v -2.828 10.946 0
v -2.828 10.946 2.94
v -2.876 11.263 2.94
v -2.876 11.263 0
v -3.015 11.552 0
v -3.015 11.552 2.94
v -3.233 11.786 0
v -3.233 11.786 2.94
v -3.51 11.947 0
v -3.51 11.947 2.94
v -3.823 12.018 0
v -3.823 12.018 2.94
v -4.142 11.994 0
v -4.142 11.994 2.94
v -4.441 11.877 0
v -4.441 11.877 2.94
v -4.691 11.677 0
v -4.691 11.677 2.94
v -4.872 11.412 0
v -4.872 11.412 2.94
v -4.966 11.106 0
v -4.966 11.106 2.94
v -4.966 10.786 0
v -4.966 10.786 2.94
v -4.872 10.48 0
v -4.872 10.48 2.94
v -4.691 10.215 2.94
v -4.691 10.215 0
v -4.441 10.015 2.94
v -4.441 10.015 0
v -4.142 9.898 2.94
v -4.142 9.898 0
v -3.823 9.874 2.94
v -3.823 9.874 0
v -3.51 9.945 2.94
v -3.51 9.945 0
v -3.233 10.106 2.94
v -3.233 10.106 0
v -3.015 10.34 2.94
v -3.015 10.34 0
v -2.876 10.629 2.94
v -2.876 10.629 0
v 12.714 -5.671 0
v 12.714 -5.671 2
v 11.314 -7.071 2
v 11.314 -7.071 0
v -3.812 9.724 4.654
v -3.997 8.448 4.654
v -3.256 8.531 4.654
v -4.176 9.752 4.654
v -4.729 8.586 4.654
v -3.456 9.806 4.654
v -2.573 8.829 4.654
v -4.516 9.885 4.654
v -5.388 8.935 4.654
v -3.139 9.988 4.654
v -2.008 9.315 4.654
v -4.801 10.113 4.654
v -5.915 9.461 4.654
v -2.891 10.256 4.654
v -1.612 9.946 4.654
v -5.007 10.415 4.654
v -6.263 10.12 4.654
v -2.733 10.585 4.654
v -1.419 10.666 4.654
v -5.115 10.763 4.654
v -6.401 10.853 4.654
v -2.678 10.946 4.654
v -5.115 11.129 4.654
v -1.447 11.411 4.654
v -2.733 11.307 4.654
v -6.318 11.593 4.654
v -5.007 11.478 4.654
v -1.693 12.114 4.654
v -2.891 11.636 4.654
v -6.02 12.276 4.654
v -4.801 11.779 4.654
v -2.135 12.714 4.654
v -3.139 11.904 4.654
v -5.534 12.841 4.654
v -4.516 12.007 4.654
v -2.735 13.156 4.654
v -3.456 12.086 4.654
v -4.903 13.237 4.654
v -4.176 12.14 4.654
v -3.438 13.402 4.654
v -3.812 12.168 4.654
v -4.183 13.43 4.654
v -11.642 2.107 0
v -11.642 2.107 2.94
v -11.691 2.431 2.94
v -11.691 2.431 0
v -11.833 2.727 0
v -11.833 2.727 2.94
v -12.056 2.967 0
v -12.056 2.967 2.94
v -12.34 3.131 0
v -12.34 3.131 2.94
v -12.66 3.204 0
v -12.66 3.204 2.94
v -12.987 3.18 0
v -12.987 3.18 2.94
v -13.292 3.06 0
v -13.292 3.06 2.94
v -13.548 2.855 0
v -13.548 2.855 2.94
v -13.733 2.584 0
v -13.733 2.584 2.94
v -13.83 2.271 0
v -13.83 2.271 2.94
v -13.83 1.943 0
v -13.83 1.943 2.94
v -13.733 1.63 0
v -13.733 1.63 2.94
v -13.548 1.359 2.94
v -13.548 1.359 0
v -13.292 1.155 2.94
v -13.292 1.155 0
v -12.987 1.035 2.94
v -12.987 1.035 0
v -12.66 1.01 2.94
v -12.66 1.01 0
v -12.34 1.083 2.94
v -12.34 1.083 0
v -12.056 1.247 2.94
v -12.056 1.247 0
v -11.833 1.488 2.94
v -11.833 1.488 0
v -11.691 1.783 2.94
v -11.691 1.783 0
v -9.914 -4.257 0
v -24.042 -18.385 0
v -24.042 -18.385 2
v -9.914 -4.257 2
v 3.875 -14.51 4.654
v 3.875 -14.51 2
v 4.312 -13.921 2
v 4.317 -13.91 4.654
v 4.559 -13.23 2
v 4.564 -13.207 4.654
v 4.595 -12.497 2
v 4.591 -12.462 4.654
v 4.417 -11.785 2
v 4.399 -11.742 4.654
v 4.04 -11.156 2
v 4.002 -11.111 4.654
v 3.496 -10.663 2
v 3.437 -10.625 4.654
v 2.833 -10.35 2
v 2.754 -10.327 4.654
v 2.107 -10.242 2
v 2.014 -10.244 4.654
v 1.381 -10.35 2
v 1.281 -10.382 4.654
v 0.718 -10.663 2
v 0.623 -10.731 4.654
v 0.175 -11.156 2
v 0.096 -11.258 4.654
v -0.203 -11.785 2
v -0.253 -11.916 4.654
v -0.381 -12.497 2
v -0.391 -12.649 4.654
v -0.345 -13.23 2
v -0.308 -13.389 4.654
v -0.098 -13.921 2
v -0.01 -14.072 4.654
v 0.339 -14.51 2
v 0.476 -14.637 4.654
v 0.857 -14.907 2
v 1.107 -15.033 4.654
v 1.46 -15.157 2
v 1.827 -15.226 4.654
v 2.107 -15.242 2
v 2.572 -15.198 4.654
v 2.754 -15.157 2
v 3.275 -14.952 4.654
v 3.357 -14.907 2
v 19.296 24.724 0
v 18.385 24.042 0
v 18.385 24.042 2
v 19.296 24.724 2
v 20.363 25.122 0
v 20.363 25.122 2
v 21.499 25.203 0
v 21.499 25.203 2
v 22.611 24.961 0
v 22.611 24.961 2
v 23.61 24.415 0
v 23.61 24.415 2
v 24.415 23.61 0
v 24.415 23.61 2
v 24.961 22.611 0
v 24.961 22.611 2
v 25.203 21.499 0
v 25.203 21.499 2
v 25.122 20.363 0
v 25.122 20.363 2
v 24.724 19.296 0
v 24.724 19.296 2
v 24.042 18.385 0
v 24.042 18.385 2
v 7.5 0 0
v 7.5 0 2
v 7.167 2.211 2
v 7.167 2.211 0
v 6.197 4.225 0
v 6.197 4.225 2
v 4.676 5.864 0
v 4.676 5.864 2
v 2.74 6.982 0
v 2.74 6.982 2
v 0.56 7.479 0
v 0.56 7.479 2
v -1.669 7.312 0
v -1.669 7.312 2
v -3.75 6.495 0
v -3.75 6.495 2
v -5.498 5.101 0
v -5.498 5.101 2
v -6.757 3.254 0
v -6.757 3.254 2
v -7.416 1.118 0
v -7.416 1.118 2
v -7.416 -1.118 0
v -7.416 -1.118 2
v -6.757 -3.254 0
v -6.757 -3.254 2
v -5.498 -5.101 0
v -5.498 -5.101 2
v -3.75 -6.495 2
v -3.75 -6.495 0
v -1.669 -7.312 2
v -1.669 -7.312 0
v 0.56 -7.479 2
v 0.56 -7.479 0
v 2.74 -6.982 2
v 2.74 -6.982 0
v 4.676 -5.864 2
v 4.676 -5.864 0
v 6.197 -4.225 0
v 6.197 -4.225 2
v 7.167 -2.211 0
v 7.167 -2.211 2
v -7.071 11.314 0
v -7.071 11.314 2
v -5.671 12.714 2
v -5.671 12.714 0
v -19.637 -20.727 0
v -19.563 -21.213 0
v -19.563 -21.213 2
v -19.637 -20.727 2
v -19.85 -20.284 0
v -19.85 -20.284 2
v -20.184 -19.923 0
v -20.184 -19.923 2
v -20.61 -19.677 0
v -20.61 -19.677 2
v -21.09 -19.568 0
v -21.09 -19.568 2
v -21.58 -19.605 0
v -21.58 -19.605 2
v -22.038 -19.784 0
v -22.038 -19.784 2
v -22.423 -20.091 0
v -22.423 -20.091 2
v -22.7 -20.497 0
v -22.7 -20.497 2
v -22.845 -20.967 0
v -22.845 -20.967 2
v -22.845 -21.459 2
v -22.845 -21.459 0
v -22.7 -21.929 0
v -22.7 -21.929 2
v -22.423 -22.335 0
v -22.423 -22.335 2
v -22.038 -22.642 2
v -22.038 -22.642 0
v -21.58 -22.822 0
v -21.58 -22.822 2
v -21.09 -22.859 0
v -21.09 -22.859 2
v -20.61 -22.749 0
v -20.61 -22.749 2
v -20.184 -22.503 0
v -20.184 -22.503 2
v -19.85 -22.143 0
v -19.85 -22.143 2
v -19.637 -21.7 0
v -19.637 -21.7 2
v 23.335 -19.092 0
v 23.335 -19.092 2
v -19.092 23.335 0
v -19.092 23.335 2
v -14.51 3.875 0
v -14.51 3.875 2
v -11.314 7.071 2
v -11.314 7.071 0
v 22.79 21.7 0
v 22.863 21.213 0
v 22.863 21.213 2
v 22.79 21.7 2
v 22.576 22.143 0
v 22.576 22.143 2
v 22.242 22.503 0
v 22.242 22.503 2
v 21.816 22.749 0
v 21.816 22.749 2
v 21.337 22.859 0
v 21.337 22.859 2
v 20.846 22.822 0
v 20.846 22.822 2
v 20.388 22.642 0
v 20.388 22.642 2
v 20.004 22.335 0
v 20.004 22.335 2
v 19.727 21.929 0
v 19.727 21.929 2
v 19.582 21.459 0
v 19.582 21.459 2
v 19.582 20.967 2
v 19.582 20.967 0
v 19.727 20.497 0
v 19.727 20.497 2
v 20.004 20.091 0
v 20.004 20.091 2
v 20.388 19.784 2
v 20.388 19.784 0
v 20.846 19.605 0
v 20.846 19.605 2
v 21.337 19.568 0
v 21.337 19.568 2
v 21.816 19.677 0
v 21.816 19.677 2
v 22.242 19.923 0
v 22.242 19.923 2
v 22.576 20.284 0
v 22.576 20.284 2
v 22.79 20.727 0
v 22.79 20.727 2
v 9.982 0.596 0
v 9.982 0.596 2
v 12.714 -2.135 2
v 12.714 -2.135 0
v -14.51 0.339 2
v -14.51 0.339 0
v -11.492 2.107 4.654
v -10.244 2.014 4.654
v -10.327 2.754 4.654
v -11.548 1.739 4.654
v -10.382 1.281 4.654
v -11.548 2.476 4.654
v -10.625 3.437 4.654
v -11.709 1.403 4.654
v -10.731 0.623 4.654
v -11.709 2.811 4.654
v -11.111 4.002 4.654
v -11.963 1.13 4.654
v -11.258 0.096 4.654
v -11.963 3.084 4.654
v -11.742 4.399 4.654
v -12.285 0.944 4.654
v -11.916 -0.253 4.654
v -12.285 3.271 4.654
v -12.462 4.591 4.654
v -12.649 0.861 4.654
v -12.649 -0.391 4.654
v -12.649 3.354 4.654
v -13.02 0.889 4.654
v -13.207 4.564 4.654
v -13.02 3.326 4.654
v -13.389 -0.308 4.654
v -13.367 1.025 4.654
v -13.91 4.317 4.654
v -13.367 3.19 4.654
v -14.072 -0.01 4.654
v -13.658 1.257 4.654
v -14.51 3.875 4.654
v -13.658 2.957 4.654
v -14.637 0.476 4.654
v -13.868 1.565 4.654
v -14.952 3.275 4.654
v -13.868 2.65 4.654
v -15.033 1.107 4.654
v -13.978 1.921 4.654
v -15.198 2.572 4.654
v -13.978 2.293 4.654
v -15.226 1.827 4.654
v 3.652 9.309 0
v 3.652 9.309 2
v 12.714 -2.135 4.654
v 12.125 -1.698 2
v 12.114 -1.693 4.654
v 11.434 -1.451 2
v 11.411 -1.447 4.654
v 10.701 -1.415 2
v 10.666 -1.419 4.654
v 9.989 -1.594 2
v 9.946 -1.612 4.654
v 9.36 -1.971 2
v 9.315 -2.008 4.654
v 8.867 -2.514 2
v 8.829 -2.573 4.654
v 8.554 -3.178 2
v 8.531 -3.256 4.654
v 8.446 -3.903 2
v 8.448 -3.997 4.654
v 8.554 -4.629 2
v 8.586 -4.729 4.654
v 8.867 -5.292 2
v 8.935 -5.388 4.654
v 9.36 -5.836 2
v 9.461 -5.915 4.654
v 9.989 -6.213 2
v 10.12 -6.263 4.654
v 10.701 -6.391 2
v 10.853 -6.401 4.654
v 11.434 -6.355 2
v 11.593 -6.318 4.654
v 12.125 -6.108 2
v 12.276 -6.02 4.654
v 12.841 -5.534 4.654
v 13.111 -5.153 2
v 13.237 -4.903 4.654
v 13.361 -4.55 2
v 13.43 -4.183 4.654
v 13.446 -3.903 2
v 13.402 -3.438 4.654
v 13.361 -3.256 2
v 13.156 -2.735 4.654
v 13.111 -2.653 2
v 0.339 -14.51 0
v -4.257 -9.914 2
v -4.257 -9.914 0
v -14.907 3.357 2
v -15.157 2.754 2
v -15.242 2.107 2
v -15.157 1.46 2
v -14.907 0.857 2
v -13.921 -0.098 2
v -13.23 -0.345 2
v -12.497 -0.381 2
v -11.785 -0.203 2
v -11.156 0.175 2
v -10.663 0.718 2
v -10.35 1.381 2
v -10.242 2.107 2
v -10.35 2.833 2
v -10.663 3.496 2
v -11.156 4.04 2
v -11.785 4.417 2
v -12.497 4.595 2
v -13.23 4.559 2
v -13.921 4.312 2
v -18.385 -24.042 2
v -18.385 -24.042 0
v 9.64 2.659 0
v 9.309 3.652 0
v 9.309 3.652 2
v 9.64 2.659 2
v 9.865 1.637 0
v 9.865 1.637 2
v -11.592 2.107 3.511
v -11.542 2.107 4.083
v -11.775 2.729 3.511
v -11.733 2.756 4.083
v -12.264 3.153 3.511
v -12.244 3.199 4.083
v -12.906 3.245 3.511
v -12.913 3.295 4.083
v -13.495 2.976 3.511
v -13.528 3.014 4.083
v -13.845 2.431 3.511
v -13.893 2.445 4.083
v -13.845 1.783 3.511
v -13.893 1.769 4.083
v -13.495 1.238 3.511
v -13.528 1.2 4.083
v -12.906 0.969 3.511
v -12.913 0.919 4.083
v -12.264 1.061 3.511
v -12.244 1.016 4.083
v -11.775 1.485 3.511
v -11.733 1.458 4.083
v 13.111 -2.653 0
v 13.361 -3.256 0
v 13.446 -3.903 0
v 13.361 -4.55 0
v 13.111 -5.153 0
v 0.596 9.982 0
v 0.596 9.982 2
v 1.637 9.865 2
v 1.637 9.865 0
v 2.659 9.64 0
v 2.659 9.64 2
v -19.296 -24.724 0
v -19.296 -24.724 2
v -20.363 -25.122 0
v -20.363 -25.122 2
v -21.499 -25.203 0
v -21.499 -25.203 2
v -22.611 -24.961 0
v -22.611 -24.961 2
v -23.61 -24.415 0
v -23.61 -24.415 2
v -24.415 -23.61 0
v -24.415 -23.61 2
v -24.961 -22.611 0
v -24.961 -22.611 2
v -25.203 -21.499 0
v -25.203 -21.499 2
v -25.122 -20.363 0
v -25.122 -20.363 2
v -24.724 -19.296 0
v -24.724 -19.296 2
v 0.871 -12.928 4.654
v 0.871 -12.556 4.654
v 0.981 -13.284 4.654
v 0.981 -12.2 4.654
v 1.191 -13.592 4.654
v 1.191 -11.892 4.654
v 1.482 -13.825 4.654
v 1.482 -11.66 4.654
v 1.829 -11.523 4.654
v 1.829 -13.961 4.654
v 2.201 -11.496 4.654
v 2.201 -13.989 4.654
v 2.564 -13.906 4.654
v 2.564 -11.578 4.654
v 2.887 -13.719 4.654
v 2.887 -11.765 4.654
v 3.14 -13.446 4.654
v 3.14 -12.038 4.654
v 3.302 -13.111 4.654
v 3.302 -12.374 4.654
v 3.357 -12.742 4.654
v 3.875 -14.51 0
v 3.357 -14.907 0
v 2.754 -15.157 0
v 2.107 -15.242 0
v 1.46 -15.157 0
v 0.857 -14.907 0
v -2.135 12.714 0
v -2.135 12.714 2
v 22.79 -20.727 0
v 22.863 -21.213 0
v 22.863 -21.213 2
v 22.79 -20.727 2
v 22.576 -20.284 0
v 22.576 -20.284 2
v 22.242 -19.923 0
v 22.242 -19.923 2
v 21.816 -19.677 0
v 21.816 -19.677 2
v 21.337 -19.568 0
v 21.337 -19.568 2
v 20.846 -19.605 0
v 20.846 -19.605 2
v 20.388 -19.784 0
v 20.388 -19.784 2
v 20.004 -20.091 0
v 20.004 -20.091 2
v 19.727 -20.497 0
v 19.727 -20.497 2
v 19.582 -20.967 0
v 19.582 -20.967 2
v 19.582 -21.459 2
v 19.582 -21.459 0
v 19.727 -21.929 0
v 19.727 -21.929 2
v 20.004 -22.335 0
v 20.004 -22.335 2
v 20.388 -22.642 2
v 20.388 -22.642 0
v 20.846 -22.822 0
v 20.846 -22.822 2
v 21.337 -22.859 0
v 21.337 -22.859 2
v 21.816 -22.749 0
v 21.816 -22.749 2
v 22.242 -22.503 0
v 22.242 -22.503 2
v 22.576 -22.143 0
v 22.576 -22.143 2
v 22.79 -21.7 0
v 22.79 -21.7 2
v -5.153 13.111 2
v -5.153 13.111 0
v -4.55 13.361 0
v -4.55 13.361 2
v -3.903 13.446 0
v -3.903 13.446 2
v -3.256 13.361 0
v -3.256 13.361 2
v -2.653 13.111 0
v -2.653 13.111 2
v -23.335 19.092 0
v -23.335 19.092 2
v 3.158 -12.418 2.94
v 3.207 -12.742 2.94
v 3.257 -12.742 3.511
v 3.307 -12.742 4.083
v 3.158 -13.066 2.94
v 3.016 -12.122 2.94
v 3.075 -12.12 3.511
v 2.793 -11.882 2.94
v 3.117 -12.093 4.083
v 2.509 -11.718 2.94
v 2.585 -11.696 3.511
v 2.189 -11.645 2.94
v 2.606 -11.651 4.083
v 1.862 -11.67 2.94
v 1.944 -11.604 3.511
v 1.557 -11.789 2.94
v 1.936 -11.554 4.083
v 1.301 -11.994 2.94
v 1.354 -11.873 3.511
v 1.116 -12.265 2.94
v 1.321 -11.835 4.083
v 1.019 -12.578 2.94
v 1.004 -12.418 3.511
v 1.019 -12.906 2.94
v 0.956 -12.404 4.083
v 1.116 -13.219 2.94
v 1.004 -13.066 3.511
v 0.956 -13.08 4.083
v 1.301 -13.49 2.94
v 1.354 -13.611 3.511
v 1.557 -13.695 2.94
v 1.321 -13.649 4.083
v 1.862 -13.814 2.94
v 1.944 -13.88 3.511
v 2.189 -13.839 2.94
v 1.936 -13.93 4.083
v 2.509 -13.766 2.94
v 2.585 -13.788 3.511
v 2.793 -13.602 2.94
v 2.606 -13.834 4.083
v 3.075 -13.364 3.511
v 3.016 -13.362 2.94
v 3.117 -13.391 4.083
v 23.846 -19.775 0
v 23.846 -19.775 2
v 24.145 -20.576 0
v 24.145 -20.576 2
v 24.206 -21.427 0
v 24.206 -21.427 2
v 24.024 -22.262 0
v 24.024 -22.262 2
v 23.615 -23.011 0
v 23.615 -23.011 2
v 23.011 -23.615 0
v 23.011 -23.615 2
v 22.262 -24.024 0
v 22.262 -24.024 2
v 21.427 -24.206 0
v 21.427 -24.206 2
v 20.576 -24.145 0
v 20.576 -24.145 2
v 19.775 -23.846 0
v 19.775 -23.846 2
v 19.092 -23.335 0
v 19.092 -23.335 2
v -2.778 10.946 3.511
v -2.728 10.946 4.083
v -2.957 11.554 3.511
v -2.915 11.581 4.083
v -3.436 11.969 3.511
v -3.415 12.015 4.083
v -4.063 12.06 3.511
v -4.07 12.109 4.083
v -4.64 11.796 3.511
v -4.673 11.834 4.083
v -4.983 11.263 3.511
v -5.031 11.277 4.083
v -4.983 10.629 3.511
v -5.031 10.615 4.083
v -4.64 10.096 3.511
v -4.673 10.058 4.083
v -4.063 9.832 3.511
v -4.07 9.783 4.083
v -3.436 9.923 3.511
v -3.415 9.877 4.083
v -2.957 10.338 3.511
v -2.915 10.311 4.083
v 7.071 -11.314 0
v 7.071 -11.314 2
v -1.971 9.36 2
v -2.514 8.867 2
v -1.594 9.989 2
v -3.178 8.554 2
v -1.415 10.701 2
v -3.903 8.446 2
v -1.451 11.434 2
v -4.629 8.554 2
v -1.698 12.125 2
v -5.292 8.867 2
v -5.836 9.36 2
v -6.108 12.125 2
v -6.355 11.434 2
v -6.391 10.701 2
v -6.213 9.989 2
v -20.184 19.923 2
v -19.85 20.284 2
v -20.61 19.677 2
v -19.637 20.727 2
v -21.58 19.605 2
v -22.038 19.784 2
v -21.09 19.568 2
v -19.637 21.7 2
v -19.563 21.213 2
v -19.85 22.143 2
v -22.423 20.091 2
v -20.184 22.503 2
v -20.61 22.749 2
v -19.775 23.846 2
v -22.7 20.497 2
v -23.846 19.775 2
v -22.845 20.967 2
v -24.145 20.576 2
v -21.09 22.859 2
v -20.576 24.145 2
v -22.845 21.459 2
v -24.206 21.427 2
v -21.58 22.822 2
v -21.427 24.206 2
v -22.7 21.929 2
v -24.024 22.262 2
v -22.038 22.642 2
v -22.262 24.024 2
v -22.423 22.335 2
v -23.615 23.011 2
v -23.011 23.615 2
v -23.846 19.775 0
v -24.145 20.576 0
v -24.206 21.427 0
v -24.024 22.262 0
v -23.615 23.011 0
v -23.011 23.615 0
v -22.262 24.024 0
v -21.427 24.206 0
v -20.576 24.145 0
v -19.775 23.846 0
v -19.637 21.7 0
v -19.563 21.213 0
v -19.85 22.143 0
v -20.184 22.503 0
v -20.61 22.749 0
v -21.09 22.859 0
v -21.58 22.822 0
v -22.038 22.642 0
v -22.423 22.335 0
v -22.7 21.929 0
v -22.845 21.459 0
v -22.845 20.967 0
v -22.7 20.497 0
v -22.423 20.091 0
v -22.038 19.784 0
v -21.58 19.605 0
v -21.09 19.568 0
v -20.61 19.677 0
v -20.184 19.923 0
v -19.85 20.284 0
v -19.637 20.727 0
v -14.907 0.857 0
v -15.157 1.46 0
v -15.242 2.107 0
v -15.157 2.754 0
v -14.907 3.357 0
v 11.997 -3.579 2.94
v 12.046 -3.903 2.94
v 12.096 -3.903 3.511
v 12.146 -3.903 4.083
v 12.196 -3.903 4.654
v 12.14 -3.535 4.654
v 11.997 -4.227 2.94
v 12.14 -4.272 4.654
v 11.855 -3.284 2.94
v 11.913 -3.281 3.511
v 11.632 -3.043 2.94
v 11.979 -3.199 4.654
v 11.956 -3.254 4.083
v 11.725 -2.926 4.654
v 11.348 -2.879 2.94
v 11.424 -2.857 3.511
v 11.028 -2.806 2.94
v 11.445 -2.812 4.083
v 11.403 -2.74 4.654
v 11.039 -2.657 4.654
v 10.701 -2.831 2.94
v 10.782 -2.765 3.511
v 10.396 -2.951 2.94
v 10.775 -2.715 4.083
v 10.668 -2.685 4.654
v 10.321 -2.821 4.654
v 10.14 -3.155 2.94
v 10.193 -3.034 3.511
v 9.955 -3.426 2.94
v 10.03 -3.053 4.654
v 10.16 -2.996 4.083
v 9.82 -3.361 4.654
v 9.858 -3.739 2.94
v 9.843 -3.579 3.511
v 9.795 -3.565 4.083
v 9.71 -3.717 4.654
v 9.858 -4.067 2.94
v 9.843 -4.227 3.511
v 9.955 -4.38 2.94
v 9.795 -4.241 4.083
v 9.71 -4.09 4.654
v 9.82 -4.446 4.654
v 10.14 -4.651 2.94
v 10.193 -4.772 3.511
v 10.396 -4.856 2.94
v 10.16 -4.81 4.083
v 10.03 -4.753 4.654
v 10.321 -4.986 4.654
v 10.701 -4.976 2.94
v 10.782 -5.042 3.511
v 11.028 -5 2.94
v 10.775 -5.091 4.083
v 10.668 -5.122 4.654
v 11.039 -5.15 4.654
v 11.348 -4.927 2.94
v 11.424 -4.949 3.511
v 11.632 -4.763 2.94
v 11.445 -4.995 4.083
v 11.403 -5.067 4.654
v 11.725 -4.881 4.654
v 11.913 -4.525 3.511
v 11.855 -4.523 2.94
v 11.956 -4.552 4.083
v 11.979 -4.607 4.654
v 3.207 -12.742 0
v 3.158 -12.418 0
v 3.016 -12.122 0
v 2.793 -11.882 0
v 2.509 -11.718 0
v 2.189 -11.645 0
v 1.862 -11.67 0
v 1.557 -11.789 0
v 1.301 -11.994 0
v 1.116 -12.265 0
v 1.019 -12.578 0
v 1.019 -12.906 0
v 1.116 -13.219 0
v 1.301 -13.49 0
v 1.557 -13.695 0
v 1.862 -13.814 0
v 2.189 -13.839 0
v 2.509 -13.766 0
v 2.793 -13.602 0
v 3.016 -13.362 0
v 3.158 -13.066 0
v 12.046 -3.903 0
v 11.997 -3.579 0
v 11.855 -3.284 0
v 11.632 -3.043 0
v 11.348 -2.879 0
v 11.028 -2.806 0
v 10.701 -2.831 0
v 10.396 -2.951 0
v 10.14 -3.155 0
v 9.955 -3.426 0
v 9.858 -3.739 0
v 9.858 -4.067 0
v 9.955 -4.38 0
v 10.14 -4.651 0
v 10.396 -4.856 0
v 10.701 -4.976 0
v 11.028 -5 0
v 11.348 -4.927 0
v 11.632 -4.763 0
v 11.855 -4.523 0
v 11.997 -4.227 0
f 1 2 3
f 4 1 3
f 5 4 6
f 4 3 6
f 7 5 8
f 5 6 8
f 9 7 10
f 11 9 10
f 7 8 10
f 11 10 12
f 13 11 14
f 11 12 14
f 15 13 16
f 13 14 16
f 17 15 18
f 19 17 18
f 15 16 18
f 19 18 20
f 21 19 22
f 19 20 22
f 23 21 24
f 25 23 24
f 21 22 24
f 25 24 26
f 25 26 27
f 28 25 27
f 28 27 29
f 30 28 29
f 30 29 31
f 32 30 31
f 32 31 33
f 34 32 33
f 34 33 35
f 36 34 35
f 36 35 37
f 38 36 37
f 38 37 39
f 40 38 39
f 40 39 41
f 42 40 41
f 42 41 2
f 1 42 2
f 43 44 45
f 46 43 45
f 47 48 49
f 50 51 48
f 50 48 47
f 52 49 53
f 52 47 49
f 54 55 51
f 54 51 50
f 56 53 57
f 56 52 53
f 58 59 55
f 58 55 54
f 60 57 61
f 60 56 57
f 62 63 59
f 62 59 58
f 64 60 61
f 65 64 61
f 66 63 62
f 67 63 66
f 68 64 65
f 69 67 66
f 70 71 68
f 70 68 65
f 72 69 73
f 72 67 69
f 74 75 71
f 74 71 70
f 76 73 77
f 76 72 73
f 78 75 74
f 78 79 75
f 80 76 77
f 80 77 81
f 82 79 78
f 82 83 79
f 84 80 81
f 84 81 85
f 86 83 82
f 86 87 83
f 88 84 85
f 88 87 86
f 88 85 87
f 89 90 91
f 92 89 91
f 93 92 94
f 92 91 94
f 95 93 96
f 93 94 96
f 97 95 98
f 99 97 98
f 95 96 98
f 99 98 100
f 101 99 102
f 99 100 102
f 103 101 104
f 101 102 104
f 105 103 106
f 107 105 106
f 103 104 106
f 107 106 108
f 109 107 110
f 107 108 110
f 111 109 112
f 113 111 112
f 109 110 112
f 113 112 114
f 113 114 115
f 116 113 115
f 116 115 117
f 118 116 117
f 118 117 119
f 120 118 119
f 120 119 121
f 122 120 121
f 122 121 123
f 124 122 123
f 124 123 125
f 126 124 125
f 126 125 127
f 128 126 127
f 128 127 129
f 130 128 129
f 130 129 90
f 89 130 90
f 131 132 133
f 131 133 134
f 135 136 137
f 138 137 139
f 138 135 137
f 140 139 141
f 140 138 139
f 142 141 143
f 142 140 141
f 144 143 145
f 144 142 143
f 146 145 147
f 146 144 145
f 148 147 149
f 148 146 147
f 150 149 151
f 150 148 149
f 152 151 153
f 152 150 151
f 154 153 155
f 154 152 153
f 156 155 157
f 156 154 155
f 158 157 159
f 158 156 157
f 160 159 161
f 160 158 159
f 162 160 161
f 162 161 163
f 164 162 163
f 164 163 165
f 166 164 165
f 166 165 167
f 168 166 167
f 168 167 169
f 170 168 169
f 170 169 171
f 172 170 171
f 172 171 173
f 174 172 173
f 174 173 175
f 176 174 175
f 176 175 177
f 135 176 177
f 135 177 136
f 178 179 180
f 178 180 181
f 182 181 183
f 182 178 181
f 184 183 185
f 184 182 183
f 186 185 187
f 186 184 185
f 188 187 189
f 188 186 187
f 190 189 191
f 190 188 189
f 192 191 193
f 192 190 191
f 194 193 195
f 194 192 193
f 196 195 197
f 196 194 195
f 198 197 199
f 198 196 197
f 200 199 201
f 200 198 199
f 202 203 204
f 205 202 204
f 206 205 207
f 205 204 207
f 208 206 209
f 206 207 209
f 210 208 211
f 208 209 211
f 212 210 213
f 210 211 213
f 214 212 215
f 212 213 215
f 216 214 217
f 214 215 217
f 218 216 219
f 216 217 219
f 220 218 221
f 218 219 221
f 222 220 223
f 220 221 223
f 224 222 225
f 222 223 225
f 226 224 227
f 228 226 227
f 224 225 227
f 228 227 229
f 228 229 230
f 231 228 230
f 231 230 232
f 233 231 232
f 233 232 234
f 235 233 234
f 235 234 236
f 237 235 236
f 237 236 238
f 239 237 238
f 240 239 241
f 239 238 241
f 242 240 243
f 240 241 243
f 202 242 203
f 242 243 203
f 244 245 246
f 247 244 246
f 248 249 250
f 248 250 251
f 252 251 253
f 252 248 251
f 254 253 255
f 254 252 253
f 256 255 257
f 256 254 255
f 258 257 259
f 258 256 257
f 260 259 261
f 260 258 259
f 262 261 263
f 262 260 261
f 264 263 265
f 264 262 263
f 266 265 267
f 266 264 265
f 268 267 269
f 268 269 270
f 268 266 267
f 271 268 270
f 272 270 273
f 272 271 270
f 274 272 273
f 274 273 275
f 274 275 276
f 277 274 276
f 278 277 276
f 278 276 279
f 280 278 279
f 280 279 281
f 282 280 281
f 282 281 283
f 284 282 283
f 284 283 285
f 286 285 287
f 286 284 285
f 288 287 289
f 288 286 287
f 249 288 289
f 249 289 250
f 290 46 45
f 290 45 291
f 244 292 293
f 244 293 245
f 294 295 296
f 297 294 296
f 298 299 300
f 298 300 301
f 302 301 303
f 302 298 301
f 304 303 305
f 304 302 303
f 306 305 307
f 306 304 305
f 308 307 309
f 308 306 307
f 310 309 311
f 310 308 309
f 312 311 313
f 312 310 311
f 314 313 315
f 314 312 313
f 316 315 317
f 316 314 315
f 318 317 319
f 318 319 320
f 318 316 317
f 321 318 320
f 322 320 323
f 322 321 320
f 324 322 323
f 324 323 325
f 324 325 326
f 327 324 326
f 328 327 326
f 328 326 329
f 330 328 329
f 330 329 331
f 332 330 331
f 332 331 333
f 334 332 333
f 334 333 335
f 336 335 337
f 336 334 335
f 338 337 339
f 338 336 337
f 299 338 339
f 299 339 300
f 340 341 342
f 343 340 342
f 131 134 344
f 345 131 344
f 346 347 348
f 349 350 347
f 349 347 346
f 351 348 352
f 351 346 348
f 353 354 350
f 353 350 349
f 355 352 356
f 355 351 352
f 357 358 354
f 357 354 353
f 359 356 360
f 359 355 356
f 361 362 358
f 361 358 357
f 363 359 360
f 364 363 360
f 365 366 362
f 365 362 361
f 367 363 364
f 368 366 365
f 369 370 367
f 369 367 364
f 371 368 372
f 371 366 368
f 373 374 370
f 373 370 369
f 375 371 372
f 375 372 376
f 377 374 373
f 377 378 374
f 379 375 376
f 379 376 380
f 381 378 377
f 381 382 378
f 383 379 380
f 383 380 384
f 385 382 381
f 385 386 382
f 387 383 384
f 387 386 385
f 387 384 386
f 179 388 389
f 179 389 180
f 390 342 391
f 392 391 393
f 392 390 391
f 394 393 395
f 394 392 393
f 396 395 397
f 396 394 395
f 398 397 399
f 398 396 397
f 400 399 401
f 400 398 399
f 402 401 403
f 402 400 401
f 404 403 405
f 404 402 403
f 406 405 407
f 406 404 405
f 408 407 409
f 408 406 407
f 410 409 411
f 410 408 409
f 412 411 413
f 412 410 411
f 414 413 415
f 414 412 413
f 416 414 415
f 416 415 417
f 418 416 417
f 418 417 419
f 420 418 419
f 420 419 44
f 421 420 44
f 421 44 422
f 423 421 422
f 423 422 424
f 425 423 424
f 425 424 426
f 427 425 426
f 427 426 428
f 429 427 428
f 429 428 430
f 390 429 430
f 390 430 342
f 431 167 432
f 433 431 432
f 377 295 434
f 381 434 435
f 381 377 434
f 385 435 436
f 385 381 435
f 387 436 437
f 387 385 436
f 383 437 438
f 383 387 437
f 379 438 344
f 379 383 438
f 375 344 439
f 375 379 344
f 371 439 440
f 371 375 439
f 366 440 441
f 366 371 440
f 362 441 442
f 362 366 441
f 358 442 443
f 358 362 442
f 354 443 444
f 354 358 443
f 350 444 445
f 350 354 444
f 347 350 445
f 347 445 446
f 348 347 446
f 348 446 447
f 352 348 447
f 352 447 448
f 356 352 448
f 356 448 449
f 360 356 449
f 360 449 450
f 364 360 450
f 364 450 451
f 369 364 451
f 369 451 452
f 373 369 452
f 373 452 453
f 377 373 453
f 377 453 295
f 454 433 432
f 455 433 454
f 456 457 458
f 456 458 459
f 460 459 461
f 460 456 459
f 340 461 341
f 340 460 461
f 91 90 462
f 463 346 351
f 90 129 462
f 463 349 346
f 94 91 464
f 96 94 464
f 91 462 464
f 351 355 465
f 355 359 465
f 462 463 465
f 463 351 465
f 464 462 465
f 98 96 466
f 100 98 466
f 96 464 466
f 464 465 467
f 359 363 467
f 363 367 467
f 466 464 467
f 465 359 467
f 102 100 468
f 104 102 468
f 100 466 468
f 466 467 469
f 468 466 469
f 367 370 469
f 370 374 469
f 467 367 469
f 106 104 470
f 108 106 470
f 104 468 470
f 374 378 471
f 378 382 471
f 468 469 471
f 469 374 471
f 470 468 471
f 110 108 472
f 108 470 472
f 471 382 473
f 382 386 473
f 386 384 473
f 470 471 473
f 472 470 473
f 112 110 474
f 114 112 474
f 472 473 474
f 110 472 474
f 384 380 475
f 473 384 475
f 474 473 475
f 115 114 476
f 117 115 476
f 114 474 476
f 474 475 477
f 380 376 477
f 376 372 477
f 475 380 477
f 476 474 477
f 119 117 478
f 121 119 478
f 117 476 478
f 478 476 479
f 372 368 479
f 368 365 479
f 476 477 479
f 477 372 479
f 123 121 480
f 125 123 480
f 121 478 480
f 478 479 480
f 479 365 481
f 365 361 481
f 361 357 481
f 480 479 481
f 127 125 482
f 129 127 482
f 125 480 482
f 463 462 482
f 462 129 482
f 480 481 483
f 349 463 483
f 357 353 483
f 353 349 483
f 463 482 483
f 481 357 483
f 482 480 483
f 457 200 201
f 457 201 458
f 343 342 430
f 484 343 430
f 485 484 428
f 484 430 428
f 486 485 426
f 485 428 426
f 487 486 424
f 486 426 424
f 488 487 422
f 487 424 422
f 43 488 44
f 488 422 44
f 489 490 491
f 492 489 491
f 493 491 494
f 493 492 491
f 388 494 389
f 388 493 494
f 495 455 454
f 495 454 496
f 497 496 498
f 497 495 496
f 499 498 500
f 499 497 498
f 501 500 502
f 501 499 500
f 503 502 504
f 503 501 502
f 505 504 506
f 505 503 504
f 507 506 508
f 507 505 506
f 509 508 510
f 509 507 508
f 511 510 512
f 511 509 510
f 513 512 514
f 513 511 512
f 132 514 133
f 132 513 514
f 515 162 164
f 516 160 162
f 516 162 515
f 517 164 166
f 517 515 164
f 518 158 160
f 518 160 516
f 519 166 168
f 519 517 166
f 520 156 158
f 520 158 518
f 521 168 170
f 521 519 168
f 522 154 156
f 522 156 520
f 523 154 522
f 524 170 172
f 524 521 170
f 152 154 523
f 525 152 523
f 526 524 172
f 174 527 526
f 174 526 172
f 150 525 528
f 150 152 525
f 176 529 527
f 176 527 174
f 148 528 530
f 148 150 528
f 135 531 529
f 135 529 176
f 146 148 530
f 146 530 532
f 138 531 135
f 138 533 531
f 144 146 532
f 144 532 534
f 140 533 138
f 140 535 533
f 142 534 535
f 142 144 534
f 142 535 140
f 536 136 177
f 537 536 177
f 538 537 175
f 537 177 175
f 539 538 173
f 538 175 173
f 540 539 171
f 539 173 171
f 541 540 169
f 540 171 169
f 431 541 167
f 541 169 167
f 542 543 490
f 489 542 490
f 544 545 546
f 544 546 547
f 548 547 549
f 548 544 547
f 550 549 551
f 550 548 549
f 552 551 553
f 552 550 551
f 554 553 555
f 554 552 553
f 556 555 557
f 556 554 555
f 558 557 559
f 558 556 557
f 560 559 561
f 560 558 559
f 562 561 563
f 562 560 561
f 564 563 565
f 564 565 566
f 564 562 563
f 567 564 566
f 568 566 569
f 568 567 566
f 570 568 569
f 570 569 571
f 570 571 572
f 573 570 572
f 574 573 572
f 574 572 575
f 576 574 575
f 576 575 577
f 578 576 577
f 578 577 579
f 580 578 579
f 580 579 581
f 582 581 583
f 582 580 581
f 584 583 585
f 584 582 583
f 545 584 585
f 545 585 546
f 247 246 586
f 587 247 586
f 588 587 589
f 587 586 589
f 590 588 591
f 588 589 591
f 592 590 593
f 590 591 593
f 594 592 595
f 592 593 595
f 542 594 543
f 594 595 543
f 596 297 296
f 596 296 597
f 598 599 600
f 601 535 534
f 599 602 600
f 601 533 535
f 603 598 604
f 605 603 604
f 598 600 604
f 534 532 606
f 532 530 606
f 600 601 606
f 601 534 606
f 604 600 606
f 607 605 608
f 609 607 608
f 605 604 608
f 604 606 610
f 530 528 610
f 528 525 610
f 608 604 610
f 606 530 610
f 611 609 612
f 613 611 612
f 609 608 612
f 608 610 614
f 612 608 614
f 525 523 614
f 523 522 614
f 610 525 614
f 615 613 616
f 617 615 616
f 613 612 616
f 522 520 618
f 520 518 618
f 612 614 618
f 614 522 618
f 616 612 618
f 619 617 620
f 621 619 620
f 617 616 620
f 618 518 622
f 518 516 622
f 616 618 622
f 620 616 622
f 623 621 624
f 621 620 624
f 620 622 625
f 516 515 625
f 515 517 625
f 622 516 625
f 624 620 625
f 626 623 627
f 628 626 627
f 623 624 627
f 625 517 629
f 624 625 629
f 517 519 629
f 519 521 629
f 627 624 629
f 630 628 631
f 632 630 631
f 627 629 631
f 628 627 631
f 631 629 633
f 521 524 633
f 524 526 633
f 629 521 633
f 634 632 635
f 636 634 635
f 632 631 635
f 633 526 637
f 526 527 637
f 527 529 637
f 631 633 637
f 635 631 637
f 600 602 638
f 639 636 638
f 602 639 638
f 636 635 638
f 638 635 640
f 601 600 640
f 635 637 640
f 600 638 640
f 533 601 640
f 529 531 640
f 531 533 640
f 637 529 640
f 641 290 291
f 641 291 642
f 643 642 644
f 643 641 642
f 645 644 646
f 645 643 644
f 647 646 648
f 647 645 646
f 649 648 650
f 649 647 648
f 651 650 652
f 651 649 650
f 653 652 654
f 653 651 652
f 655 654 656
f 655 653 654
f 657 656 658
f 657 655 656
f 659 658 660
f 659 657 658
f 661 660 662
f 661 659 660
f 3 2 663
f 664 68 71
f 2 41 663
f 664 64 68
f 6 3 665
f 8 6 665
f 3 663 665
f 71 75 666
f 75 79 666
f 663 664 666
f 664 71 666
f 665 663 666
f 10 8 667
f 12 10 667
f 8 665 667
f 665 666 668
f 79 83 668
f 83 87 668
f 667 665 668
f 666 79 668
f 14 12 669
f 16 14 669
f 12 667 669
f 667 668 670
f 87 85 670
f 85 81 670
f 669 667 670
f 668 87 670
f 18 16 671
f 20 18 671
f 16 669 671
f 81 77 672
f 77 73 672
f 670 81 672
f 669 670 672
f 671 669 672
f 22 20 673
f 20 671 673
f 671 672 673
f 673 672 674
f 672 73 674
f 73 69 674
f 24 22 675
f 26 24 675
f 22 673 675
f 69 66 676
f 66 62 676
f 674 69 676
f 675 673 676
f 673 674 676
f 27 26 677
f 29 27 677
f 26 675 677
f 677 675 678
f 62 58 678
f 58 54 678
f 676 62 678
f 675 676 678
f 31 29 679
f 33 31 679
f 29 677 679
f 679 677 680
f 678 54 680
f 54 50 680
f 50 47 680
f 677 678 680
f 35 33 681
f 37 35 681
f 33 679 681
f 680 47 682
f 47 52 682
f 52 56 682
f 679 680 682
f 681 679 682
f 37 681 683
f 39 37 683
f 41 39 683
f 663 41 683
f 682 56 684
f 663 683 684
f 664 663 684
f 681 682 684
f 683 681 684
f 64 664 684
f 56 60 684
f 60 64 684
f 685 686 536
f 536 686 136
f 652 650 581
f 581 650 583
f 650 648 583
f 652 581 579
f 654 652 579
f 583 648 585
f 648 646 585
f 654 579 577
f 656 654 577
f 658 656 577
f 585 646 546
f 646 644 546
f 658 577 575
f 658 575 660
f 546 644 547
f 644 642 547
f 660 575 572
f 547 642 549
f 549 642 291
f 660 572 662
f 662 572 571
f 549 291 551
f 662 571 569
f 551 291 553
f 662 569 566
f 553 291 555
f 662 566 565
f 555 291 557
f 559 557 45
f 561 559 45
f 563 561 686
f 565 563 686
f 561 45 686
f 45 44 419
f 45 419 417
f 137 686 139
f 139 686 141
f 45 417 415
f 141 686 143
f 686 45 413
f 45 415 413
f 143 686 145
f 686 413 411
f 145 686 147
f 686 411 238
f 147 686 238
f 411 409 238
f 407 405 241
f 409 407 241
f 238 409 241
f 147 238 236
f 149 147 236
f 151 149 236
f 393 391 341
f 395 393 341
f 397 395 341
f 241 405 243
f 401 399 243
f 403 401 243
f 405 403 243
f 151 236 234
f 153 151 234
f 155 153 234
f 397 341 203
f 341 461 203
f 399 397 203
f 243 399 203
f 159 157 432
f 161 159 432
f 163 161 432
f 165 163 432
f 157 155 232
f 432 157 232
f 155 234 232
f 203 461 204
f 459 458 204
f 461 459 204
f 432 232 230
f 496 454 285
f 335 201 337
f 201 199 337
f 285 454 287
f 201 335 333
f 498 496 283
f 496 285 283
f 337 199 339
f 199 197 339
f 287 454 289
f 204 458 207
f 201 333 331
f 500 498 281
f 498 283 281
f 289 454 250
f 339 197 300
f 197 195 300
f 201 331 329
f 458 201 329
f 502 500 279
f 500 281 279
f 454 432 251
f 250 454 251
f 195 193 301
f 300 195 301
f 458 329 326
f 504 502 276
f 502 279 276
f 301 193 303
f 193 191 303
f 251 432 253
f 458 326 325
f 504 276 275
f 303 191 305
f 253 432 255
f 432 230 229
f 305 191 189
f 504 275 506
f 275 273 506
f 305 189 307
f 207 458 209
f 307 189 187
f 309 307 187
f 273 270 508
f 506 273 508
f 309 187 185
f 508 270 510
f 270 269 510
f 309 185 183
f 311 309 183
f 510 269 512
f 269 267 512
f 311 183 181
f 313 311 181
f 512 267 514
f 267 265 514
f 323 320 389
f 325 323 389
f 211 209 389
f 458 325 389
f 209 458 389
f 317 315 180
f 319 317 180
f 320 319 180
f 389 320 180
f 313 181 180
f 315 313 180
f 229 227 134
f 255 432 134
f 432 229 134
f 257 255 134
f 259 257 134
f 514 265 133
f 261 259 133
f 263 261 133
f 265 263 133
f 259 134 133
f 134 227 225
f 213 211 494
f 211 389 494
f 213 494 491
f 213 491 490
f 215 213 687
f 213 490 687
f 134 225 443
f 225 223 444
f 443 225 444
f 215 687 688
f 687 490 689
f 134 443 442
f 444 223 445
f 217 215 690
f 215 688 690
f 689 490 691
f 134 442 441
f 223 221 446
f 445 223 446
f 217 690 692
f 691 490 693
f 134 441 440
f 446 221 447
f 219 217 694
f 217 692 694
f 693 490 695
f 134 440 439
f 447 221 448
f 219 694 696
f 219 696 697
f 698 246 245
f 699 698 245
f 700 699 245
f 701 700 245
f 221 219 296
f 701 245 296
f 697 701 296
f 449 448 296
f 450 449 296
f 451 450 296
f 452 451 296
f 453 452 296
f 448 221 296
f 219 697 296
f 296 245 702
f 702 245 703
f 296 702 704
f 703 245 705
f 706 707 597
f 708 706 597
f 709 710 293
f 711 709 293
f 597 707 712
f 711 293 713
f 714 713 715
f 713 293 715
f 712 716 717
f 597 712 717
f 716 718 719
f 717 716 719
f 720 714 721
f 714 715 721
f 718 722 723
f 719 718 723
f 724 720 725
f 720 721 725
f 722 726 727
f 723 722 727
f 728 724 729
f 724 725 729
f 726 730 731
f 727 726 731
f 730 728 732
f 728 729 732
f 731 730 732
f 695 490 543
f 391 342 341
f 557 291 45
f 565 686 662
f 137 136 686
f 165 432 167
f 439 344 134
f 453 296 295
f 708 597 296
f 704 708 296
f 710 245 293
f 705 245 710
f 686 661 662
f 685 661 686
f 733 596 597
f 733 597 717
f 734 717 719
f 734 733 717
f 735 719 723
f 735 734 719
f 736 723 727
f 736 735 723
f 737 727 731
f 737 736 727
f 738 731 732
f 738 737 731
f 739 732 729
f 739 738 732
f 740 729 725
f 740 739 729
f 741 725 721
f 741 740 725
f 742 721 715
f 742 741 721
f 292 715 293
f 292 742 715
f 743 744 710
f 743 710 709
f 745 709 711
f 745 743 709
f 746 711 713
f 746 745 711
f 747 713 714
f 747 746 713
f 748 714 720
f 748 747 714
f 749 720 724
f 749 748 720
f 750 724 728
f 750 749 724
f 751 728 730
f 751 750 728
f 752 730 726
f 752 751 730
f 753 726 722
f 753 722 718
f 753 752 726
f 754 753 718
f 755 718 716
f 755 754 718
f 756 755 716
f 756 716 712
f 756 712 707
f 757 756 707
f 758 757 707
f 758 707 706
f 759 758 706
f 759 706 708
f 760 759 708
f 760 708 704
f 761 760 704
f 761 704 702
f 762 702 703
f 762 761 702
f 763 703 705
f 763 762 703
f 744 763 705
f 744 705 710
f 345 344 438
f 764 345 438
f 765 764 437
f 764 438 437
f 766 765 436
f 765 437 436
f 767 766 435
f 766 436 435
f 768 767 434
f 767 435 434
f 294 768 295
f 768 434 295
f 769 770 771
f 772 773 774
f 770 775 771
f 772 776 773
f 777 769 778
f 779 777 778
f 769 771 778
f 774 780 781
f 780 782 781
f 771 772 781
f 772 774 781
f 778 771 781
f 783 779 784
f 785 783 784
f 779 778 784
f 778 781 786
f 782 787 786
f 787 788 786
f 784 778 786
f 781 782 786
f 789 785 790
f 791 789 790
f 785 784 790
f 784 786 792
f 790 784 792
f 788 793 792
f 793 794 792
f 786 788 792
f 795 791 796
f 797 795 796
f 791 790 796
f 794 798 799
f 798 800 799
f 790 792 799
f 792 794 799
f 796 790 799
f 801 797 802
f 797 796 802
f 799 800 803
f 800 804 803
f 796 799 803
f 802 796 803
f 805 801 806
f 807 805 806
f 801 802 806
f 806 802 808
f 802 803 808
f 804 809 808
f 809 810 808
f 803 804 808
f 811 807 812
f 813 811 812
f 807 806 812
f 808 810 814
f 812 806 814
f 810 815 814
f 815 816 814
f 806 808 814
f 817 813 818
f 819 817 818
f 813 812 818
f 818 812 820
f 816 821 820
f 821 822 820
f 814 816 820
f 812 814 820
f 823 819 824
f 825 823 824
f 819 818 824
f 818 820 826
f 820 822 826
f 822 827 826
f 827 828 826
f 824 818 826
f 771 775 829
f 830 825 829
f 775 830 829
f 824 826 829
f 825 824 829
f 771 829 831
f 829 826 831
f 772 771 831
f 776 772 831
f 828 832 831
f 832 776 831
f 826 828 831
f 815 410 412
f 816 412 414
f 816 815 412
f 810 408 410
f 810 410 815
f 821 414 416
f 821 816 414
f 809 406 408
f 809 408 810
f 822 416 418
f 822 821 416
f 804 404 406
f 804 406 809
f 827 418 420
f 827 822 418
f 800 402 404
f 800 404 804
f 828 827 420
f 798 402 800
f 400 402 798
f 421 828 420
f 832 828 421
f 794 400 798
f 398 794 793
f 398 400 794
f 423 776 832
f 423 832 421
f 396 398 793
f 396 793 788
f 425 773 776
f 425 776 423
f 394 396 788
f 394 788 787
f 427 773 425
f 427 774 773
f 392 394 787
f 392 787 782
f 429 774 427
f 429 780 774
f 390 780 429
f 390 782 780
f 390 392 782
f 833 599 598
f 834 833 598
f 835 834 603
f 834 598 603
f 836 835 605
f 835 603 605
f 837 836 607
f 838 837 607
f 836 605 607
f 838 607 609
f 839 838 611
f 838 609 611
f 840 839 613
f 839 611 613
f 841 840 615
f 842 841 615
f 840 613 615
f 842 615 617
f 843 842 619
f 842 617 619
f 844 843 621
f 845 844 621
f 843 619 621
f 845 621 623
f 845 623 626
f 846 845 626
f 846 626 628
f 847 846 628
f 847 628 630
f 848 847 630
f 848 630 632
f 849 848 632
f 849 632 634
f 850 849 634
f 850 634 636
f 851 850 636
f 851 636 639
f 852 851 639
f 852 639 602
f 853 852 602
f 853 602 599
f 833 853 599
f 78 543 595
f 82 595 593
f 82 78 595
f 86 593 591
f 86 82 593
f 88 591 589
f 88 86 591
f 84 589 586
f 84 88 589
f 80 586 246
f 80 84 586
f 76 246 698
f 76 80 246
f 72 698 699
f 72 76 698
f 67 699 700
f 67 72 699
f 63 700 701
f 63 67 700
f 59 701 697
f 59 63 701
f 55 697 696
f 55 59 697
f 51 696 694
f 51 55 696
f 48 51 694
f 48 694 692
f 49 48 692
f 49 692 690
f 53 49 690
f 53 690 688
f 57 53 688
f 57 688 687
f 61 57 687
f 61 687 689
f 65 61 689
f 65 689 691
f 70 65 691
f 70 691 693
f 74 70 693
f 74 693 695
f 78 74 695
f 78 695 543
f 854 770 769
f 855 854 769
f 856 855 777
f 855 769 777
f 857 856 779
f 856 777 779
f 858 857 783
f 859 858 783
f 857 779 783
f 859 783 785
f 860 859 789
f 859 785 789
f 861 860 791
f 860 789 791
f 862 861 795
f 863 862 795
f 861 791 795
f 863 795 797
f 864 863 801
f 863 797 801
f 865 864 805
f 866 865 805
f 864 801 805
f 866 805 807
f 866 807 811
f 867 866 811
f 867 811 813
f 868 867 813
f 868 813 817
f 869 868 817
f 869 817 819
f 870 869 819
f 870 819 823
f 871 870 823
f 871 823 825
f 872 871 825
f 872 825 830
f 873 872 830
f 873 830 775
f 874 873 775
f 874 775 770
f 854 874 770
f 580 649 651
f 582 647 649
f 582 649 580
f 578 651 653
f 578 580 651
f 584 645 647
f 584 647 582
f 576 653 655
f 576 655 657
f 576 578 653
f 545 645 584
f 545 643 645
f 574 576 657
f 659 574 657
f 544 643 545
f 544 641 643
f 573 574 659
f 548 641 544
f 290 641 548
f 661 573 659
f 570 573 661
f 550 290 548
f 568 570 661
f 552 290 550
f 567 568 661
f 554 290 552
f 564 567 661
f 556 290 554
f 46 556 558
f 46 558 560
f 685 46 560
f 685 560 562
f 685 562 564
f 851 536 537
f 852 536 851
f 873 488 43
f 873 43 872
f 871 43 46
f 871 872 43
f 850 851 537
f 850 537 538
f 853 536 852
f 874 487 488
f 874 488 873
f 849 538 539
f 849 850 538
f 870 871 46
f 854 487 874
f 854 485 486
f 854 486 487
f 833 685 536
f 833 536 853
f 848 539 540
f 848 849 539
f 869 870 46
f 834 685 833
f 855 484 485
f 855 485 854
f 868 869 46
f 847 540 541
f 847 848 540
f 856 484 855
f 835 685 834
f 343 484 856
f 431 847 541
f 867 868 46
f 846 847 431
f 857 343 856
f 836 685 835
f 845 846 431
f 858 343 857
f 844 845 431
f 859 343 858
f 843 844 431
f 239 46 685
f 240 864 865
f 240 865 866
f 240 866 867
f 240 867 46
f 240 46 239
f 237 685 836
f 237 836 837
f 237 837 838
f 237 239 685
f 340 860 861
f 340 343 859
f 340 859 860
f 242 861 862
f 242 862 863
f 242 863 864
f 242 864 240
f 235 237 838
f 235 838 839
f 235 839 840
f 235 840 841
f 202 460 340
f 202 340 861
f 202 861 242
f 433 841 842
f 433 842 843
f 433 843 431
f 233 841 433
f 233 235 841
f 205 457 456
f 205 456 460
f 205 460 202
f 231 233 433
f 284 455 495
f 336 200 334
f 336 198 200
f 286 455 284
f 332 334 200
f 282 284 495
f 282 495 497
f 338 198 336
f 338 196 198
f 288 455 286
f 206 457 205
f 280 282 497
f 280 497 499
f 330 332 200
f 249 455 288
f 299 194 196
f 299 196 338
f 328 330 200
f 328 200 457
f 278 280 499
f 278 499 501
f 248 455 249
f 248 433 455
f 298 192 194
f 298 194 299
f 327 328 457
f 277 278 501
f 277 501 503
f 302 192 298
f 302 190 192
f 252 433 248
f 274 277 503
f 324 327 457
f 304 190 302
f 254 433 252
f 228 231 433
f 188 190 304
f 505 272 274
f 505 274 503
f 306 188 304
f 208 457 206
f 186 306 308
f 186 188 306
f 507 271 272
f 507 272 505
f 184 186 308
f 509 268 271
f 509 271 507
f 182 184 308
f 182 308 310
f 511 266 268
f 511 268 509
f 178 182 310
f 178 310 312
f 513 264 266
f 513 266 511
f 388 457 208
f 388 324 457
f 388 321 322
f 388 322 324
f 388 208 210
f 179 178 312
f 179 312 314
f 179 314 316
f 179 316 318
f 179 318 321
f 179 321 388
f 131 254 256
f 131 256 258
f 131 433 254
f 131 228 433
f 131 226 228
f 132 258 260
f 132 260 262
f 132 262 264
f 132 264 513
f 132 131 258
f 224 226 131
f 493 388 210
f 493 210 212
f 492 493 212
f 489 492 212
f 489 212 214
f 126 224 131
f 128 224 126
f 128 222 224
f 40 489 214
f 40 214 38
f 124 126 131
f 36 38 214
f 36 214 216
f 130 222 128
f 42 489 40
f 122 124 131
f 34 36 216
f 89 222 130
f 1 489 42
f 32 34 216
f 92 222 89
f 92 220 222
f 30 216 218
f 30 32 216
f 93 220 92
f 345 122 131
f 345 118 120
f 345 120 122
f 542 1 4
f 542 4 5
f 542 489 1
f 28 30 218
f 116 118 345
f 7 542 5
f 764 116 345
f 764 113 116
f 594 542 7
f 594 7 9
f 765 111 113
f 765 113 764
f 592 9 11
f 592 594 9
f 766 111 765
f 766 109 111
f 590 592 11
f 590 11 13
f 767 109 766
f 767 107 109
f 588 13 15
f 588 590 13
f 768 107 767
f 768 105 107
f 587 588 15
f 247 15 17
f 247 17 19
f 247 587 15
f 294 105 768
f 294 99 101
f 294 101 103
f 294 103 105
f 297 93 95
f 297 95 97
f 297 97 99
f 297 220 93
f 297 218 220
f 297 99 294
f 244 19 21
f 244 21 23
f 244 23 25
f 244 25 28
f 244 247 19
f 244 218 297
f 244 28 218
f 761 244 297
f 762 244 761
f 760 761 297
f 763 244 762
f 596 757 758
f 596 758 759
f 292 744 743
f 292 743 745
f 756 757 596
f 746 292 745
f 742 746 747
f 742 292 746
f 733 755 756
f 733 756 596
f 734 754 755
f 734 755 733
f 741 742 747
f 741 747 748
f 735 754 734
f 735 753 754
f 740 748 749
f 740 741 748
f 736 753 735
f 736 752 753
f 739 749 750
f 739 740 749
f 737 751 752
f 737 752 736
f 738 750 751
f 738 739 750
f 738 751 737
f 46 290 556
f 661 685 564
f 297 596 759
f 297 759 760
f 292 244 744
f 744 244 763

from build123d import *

# Parameters (mm, degrees)
SKETCH1_R           = 1.65
BOSS_EXTRUDE1_DEPTH = 2
SKETCH2_R           = 1.25
BOSS_EXTRUDE2_DEPTH = 2
SKETCH3_R           = 7.5
CUT_EXTRUDE1_DEPTH  = 2
BOSS_EXTRUDE3_START = 2.65408
SKETCH4_R           = 2.5
SKETCH4_R_2         = 1.25
BOSS_EXTRUDE3_DEPTH = 2.65408
SKETCH5_R           = 1.797788616
SKETCH5_R_2         = 1.10000034
SKETCH5_R_3         = 2.012466026
SKETCH5_R_4         = 1.729091626
SKETCH5_R_5         = 1.81324602
SKETCH5_R_6         = 1.075
BOSS_EXTRUDE4_DEPTH = 4.65408
CHAMFER1_SIZE       = 1.714507845
CHAMFER1_SIZE_2     = 0.15


with BuildPart() as part:
    # Sketch1 → Boss-Extrude1 (new body)
    with BuildSketch(Plane.XY):
        with BuildLine():
            Line((24.04163056, 18.384776311), (9.309167823, 3.652313574))
            ThreePointArc((9.309167823, 3.652313574), (9.985739131, -0.533867035), (8.866689125, -4.624048438))
            Line((8.866689125, -4.624048438), (23.334523779, -19.091883092))
            ThreePointArc((23.334523779, -19.091883092), (23.334523779, -23.334523779), (19.091883092, -23.334523779))
            Line((19.091883092, -23.334523779), (4.624048438, -8.866689125))
            ThreePointArc((4.624048438, -8.866689125), (0.533867035, -9.985739131), (-3.652313574, -9.309167823))
            Line((-3.652313574, -9.309167823), (-18.384776311, -24.04163056))
            ThreePointArc((-18.384776311, -24.04163056), (-24.04163056, -24.04163056), (-24.04163056, -18.384776311))
            Line((-24.04163056, -18.384776311), (-9.309167823, -3.652313574))
            ThreePointArc((-9.309167823, -3.652313574), (-9.985739131, 0.533867035), (-8.866689125, 4.624048438))
            Line((-8.866689125, 4.624048438), (-23.334523779, 19.091883092))
            ThreePointArc((-23.334523779, 19.091883092), (-23.334523779, 23.334523779), (-19.091883092, 23.334523779))
            Line((-19.091883092, 23.334523779), (-4.624048438, 8.866689125))
            ThreePointArc((-4.624048438, 8.866689125), (-0.533867035, 9.985739131), (3.652313574, 9.309167823))
            Line((3.652313574, 9.309167823), (18.384776311, 24.04163056))
            ThreePointArc((18.384776311, 24.04163056), (24.04163056, 24.04163056), (24.04163056, 18.384776311))
        make_face()
        with Locations((21.213203436, -21.213203436)):
            Circle(SKETCH1_R, mode=Mode.SUBTRACT)
        with Locations((21.213203436, 21.213203436)):
            Circle(SKETCH1_R, mode=Mode.SUBTRACT)
        with Locations((-21.213203436, 21.213203436)):
            Circle(SKETCH1_R, mode=Mode.SUBTRACT)
        with Locations((-21.213203436, -21.213203436)):
            Circle(SKETCH1_R, mode=Mode.SUBTRACT)
    extrude(amount=BOSS_EXTRUDE1_DEPTH)

    # Sketch2 → Boss-Extrude2 (add)
    with BuildSketch(Plane.XY.offset(2)):
        with BuildLine():
            Line((-2.135460216, 12.713781538), (12.713781227, -2.135459905))
            ThreePointArc((12.713781227, -2.135459905), (13.446014274, -3.903226858), (12.713781227, -5.670993811))
            Line((12.713781227, -5.670993811), (3.874947975, -14.509827063))
            ThreePointArc((3.874947975, -14.509827063), (2.107181022, -15.24206011), (0.339414069, -14.509827063))
            Line((0.339414069, -14.509827063), (-14.509827374, 0.33941438))
            ThreePointArc((-14.509827374, 0.33941438), (-15.242060421, 2.107181333), (-14.509827374, 3.874948286))
            Line((-14.509827374, 3.874948286), (-5.670994122, 12.713781538))
            ThreePointArc((-5.670994122, 12.713781538), (-3.903227169, 13.446014585), (-2.135460216, 12.713781538))
        make_face()
        with Locations((-3.903227169, 10.946014585)):
            Circle(SKETCH2_R, mode=Mode.SUBTRACT)
        with Locations((10.946014274, -3.903226858)):
            Circle(SKETCH2_R, mode=Mode.SUBTRACT)
        with Locations((2.107181022, -12.74206011)):
            Circle(SKETCH2_R, mode=Mode.SUBTRACT)
        with Locations((-12.742060421, 2.107181333)):
            Circle(SKETCH2_R, mode=Mode.SUBTRACT)
    extrude(amount=-BOSS_EXTRUDE2_DEPTH)

    # Sketch3 → Cut-Extrude1 (cut)
    with BuildSketch(Plane.XY.offset(2)):
        Circle(SKETCH3_R)
    extrude(amount=-CUT_EXTRUDE1_DEPTH, mode=Mode.SUBTRACT)

    # Sketch4 → Boss-Extrude3 (add)
    # profile 1 of 4: a face of its own
    with BuildSketch(Plane.XY.offset(2).offset(BOSS_EXTRUDE3_START)):
        with Locations(Location((-3.903227169, 10.946014585, 0), (0, 0, 45))):
            Circle(SKETCH4_R)
        with Locations((-3.903227169, 10.946014585)):
            Circle(SKETCH4_R_2, mode=Mode.SUBTRACT)
    # profile 2 of 4: a face of its own
    with BuildSketch(Plane.XY.offset(2).offset(BOSS_EXTRUDE3_START)):
        with Locations(Location((-12.742060421, 2.107181333, 0), (0, 0, 135))):
            Circle(SKETCH4_R)
        with Locations((-12.742060421, 2.107181333)):
            Circle(SKETCH4_R_2, mode=Mode.SUBTRACT)
    # profile 3 of 4: a face of its own
    with BuildSketch(Plane.XY.offset(2).offset(BOSS_EXTRUDE3_START)):
        with Locations(Location((10.946014274, -3.903226858, 0), (0, 0, 45))):
            Circle(SKETCH4_R)
        with Locations((10.946014274, -3.903226858)):
            Circle(SKETCH4_R_2, mode=Mode.SUBTRACT)
    # profile 4 of 4: a face of its own
    with BuildSketch(Plane.XY.offset(2).offset(BOSS_EXTRUDE3_START)):
        with Locations(Location((2.107181022, -12.74206011, 0), (0, 0, 315))):
            Circle(SKETCH4_R)
        with Locations((2.107181022, -12.74206011)):
            Circle(SKETCH4_R_2, mode=Mode.SUBTRACT)
    extrude(amount=-BOSS_EXTRUDE3_DEPTH)

    # Sketch5 → Boss-Extrude4 (add)
    # profile 1 of 4: a face of its own
    with BuildSketch(Plane.XY.offset(4.65408)):
        with Locations((10.946014274, -3.903226858)):
            Circle(SKETCH5_R)
        with Locations((10.946014274, -3.903226858)):
            Circle(SKETCH5_R_2, mode=Mode.SUBTRACT)
    # profile 2 of 4: a face of its own
    with BuildSketch(Plane.XY.offset(4.65408)):
        with Locations((2.107181022, -12.74206011)):
            Circle(SKETCH5_R_3)
        with Locations((2.107181022, -12.74206011)):
            Circle(SKETCH5_R_2, mode=Mode.SUBTRACT)
    # profile 3 of 4: a face of its own
    with BuildSketch(Plane.XY.offset(4.65408)):
        with Locations((-12.742060421, 2.107181333)):
            Circle(SKETCH5_R_4)
        with Locations((-12.742060421, 2.107181333)):
            Circle(SKETCH5_R_2, mode=Mode.SUBTRACT)
    # profile 4 of 4: a face of its own
    with BuildSketch(Plane.XY.offset(4.65408)):
        with Locations((-3.903227169, 10.946014585)):
            Circle(SKETCH5_R_5)
        with Locations((-3.903227169, 10.946014585)):
            Circle(SKETCH5_R_6, mode=Mode.SUBTRACT)
    extrude(amount=-BOSS_EXTRUDE4_DEPTH)

    # Chamfer1
    # the kernel refuses this chamfer: 1.714507845, 0.15 mm, written as the material it takes off along each edge
    with BuildSketch(Plane(origin=(10.946014274, -3.903226858, 4.65408), x_dir=(1, 0, 0), z_dir=(0, -1, 0))) as chamfer1_piece_1:
        Polygon((1.10000034, -CHAMFER1_SIZE), (1.10000034 + CHAMFER1_SIZE_2, 0), (1.10000034, 0), align=None)
    revolve(axis=Axis((10.946014274, -3.903226858, 4.65408), (0, 0, 1)), mode=Mode.SUBTRACT)
    with BuildSketch(Plane(origin=(2.107181022, -12.74206011, 4.65408), x_dir=(1, 0, 0), z_dir=(0, -1, 0))) as chamfer1_piece_2:
        Polygon((1.10000034, -CHAMFER1_SIZE), (1.10000034 + CHAMFER1_SIZE_2, 0), (1.10000034, 0), align=None)
    revolve(axis=Axis((2.107181022, -12.74206011, 4.65408), (0, 0, 1)), mode=Mode.SUBTRACT)
    with BuildSketch(Plane(origin=(-12.742060421, 2.107181333, 4.65408), x_dir=(1, 0, 0), z_dir=(0, -1, 0))) as chamfer1_piece_3:
        Polygon((1.10000034, -CHAMFER1_SIZE), (1.10000034 + CHAMFER1_SIZE_2, 0), (1.10000034, 0), align=None)
    revolve(axis=Axis((-12.742060421, 2.107181333, 4.65408), (0, 0, 1)), mode=Mode.SUBTRACT)
    with BuildSketch(Plane(origin=(-3.903227169, 10.946014585, 4.65408), x_dir=(1, 0, 0), z_dir=(0, -1, 0))) as chamfer1_piece_4:
        Polygon((1.075, -CHAMFER1_SIZE), (1.075 + CHAMFER1_SIZE_2, 0), (1.075, 0), align=None)
    revolve(axis=Axis((-3.903227169, 10.946014585, 4.65408), (0, 0, 1)), mode=Mode.SUBTRACT)


solid = part.part
